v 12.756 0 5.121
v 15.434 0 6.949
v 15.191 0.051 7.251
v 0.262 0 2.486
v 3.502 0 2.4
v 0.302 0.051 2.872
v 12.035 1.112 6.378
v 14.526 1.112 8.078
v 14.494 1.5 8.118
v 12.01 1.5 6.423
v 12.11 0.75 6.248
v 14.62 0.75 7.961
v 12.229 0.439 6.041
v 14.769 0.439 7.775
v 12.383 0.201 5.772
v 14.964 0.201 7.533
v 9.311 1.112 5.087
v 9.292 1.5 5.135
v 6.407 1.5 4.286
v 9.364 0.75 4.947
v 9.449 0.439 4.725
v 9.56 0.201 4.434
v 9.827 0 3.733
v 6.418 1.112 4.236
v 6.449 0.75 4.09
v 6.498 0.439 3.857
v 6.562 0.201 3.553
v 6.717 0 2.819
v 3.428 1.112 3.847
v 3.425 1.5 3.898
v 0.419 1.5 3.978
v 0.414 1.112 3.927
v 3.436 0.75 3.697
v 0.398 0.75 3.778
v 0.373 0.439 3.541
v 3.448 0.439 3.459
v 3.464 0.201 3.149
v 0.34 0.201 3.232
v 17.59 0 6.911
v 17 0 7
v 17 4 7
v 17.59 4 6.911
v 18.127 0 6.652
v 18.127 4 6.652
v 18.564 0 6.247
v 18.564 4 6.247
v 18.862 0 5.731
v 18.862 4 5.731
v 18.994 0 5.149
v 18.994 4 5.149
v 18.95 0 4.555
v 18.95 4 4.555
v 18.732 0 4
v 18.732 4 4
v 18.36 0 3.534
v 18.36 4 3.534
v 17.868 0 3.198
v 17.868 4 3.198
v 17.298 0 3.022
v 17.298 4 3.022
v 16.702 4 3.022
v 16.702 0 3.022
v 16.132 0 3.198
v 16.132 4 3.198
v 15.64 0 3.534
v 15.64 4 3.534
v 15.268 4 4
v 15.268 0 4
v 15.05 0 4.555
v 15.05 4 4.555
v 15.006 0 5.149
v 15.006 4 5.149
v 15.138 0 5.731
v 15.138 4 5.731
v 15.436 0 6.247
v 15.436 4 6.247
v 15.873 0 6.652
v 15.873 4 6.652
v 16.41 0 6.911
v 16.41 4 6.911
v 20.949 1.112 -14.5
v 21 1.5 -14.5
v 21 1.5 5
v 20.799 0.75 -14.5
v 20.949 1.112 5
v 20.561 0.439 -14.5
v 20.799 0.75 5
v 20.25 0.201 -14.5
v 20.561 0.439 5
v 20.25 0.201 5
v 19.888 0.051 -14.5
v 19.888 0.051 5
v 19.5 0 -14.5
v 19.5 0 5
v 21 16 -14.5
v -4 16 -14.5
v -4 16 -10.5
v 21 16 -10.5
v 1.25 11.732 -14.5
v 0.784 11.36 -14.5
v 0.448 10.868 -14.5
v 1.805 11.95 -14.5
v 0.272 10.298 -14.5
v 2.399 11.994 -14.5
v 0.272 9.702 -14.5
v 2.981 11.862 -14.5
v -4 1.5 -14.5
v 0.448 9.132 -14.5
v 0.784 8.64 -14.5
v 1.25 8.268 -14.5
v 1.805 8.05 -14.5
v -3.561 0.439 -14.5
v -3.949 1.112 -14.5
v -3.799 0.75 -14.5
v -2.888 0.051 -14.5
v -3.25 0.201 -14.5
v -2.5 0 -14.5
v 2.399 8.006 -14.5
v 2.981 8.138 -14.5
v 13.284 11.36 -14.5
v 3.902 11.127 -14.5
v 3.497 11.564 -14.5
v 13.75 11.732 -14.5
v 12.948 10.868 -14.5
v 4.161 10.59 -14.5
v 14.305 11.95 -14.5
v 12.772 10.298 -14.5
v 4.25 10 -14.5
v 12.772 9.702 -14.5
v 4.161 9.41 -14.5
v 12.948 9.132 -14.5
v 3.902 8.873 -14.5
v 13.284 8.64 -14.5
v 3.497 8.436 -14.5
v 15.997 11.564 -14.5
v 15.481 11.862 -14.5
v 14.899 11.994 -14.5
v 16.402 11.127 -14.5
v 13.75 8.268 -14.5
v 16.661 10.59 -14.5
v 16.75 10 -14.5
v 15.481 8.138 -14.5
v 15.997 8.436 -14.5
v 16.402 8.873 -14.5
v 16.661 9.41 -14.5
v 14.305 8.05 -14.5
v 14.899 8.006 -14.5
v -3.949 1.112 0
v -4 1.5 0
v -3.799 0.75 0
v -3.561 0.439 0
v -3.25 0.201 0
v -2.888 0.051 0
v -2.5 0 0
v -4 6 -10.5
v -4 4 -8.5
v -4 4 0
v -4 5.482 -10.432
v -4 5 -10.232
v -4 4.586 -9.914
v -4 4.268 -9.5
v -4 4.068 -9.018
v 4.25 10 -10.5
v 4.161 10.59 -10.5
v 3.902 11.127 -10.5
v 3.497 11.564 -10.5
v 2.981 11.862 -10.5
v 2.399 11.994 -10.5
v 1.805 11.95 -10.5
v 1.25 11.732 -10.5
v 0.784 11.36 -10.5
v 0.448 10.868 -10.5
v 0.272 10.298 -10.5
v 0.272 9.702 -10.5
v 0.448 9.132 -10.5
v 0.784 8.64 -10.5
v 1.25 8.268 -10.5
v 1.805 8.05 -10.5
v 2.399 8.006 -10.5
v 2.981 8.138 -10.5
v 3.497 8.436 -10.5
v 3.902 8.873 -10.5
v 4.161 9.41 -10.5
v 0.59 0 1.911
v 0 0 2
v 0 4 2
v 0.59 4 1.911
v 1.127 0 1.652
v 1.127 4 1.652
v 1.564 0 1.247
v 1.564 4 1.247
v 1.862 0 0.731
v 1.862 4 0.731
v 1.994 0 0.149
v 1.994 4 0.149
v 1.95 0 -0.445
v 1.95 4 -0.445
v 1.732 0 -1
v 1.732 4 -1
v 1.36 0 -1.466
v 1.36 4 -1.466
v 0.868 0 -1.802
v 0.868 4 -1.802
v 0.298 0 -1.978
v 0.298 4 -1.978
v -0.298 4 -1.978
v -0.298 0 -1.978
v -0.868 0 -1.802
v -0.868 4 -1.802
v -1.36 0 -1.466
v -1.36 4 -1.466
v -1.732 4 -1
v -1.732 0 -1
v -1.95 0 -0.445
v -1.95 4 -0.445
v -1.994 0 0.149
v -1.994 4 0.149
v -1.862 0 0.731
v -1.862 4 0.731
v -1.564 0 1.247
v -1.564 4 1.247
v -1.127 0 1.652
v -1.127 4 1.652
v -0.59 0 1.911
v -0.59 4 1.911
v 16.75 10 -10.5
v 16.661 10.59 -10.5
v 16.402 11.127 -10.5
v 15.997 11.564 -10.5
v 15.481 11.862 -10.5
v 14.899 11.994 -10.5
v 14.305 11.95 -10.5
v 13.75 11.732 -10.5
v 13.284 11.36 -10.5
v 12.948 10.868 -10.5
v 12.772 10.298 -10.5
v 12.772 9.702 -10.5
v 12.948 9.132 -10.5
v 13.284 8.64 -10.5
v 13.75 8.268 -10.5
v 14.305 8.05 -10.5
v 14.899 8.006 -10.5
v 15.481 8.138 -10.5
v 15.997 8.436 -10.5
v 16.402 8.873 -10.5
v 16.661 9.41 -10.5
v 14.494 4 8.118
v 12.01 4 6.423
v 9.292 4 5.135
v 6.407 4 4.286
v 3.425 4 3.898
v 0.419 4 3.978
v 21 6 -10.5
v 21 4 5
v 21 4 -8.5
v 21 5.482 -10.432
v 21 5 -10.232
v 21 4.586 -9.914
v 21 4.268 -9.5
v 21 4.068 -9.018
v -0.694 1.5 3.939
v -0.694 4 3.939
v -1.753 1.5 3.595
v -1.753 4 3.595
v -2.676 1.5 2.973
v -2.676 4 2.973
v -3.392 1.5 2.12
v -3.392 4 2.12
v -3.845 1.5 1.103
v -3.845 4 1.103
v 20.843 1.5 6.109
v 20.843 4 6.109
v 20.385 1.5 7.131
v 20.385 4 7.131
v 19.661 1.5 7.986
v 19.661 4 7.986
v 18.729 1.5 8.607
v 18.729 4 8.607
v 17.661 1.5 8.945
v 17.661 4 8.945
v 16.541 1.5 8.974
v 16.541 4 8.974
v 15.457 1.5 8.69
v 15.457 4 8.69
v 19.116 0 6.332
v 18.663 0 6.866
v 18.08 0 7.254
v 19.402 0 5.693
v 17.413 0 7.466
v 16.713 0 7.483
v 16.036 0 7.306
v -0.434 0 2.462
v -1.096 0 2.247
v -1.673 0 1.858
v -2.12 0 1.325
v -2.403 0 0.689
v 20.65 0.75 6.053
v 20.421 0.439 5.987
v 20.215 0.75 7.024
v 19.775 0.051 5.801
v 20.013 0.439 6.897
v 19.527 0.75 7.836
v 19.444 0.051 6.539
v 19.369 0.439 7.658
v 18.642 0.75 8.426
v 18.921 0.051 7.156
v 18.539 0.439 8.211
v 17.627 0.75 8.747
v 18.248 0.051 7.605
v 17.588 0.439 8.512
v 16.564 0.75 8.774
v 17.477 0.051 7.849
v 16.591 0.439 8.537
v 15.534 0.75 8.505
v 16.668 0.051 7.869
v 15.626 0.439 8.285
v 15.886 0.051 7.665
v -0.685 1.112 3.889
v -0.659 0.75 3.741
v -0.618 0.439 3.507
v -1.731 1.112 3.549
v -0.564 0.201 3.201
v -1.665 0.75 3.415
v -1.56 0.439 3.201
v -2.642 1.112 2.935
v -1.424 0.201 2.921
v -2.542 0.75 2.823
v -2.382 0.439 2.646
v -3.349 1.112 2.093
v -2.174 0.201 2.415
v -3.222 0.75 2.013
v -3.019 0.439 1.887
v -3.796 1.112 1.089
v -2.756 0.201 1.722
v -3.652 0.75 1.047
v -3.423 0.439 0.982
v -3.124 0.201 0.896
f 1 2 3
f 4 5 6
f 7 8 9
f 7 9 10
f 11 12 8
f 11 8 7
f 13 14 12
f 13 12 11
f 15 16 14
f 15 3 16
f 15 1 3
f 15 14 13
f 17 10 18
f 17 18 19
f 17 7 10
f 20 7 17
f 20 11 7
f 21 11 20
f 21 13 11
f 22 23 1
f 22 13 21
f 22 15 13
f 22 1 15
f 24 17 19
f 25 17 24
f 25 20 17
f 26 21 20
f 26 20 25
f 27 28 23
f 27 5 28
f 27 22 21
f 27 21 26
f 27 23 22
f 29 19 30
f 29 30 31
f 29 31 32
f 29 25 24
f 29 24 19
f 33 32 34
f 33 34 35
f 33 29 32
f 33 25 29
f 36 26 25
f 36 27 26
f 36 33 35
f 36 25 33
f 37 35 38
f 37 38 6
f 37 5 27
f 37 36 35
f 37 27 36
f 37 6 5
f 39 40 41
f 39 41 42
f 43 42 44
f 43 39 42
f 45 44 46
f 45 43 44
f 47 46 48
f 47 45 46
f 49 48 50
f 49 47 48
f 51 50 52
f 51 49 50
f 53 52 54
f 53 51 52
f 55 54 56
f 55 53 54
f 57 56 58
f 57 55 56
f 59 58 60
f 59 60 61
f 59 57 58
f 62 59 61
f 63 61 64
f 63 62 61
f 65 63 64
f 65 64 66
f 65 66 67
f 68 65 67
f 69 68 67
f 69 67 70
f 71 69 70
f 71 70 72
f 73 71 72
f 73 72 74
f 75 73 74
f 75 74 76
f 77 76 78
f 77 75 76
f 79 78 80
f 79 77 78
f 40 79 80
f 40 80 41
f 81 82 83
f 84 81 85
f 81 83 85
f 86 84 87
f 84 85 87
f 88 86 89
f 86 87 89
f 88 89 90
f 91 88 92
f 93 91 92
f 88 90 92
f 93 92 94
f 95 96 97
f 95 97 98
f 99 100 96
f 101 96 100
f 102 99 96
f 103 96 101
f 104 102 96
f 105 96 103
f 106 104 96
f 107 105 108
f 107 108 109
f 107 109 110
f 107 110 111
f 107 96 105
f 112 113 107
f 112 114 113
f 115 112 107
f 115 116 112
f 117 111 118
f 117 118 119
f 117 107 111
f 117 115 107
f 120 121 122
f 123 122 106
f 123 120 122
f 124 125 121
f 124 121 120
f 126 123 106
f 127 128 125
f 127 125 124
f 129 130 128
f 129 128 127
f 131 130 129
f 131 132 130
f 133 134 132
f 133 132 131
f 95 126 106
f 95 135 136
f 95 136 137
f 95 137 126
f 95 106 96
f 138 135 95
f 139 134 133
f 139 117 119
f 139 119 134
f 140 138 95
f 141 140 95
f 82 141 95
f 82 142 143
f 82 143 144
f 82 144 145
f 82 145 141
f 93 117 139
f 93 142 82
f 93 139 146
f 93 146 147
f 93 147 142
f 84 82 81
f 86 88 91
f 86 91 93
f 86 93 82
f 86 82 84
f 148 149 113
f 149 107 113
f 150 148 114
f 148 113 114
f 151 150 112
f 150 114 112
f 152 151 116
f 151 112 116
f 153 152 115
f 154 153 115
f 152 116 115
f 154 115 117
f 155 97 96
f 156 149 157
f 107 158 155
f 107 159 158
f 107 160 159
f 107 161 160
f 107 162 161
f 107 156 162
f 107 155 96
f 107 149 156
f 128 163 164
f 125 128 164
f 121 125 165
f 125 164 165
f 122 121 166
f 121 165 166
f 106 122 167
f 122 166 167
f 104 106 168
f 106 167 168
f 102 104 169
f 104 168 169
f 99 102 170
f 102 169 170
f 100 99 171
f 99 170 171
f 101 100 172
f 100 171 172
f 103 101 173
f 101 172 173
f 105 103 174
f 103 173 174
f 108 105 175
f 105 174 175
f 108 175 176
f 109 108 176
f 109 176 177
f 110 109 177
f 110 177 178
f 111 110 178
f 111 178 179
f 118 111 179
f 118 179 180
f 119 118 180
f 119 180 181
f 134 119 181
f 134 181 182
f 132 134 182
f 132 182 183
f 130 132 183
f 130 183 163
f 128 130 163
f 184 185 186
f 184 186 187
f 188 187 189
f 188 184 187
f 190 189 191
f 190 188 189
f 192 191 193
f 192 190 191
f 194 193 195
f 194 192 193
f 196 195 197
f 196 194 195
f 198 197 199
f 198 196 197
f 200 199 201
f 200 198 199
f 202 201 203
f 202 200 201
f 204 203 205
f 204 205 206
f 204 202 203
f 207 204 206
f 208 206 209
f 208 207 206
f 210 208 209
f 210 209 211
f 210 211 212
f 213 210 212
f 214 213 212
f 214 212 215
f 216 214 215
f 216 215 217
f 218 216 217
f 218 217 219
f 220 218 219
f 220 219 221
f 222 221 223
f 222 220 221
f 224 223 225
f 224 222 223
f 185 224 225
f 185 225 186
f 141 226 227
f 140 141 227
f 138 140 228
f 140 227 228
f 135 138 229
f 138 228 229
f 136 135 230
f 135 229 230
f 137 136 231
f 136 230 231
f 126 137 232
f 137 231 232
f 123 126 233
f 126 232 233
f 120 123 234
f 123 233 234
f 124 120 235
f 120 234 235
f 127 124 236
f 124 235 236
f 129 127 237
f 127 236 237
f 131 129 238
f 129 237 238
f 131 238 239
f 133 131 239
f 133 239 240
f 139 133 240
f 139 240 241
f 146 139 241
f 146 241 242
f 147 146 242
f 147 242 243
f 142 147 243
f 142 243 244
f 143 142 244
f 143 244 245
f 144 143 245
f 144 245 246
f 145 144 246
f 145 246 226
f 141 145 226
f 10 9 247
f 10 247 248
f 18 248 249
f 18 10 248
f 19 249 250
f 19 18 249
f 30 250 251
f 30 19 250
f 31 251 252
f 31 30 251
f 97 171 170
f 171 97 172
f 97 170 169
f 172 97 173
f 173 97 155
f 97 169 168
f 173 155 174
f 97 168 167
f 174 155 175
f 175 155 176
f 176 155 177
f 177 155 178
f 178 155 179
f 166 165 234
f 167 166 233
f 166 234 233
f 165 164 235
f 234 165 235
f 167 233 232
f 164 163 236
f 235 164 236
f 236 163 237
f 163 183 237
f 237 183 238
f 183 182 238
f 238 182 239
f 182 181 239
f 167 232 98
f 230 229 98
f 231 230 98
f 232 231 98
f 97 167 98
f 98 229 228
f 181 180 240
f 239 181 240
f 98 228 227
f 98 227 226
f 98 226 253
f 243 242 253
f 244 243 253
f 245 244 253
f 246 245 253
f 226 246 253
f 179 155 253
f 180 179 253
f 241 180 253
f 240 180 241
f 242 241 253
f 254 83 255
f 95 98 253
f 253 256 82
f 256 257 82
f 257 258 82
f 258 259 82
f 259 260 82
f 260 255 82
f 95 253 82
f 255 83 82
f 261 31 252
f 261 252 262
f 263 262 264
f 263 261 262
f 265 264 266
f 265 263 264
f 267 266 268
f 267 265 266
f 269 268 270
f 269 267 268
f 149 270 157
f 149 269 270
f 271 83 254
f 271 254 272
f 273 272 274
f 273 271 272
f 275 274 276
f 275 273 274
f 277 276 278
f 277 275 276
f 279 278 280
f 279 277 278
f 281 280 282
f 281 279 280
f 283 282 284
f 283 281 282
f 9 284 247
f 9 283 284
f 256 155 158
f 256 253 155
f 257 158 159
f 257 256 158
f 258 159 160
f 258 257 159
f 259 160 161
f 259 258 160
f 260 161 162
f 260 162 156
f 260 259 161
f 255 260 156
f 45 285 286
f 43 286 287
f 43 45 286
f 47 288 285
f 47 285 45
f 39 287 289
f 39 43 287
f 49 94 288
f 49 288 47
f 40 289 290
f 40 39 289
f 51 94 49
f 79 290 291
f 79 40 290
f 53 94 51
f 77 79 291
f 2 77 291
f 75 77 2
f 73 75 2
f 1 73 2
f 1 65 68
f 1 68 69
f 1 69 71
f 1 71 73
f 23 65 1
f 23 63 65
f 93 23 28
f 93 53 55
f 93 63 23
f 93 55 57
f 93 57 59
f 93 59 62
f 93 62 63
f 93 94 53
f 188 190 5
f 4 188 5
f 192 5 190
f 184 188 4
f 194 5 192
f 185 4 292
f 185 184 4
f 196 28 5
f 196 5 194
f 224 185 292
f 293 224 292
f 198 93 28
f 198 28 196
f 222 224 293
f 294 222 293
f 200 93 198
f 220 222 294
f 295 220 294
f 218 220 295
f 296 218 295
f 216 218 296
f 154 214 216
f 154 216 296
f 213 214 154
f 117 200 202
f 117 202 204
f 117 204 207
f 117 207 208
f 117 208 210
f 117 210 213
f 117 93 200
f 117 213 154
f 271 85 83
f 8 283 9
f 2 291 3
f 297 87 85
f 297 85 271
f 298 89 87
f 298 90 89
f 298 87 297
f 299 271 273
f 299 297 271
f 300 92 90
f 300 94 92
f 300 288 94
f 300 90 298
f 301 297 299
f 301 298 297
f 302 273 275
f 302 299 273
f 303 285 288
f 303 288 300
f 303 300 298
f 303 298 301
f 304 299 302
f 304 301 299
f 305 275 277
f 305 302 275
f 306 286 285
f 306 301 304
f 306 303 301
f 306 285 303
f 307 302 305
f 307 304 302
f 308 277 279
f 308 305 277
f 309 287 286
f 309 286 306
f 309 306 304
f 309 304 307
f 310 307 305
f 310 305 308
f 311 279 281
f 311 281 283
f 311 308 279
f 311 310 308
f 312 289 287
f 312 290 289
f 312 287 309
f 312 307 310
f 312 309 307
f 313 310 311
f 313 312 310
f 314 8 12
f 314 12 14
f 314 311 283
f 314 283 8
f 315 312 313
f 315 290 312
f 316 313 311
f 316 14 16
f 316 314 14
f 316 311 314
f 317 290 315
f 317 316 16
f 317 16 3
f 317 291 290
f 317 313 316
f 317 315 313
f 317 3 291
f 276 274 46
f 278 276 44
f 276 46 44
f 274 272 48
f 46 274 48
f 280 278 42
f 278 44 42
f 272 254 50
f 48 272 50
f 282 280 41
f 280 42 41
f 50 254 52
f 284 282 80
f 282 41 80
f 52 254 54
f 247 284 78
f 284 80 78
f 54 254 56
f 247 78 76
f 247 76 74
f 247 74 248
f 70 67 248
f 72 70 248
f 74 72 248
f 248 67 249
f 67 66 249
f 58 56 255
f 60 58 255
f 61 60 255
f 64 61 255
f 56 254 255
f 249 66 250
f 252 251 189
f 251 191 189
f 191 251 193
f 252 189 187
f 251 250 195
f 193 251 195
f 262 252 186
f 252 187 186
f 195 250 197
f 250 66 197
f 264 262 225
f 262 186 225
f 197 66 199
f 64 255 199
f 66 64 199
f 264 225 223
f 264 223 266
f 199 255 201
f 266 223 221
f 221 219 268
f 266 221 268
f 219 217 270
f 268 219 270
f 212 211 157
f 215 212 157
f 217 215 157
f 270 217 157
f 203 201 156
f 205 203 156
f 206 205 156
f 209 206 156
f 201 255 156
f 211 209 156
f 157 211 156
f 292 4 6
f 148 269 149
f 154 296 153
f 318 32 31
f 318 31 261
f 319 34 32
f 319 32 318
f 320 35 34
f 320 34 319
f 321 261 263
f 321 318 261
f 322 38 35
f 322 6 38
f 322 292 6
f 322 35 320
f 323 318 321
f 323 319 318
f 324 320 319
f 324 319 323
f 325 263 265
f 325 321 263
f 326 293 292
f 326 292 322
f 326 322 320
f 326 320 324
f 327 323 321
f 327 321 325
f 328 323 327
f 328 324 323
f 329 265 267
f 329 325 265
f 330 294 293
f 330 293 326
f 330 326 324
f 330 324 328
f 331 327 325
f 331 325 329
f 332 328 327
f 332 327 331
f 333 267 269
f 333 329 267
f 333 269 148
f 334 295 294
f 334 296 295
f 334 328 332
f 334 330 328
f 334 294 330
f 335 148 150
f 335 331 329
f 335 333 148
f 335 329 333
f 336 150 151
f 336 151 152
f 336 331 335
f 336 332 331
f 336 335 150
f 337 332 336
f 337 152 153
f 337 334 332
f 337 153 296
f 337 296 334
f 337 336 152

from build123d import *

# Parameters (mm, degrees)
SKETCH1_R           = 2
BOSS_EXTRUDE1_DEPTH = 4
SKETCH2_W           = 25
SKETCH2_H           = 4
BOSS_EXTRUDE2_DEPTH = 12
SKETCH3_R           = 2
CUT_EXTRUDE1_DEPTH  = 12
FILLET1_R           = 2
FILLET2_R           = 1.5


with BuildPart() as part:
    # Sketch1 → Boss-Extrude1 (new body)
    with BuildSketch(Plane(origin=(0, 0, 0), x_dir=(1, 0, 0), z_dir=(0, 1, 0))):
        with BuildLine():
            Line((-4, 14.5), (21, 14.5))
            Line((21, 14.5), (21, -5))
            ThreePointArc((21, -5), (18.728627677, -8.607193695), (14.494076823, -8.117747429))
            ThreePointArc((14.494076823, -8.117747429), (7.866380142, -4.654307517), (0.418938394, -3.978000832))
            ThreePointArc((0.418938394, -3.978000832), (-2.676214343, -2.972856671), (-4, 0))
            Line((-4, 0), (-4, 14.5))
        make_face()
        with Locations(Location((0, 0, 0), (0, 0, 270))):
            Circle(SKETCH1_R, mode=Mode.SUBTRACT)
        with Locations(Location((17, -5, 0), (0, 0, 270))):
            Circle(SKETCH1_R, mode=Mode.SUBTRACT)
    extrude(amount=BOSS_EXTRUDE1_DEPTH)

    # Sketch2 → Boss-Extrude2 (add)
    with BuildSketch(Plane(origin=(0, 4, 0), x_dir=(1, 0, 0), z_dir=(0, 1, 0))):
        with Locations((8.5, 12.5)):
            Rectangle(SKETCH2_W, SKETCH2_H)
    extrude(amount=BOSS_EXTRUDE2_DEPTH)

    # Sketch3 → Cut-Extrude1 (cut)
    with BuildSketch(Plane.XY.offset(-10.5)):
        with Locations((2.25, 10)):
            Circle(SKETCH3_R)
        with Locations((14.75, 10)):
            Circle(SKETCH3_R)
    extrude(amount=-CUT_EXTRUDE1_DEPTH, mode=Mode.SUBTRACT)

    # Fillet1
    fillet1_edges = [part.edges().sort_by_distance(p)[0] for p in [
        (8.5, 4, -10.5),
    ]]
    fillet(fillet1_edges, radius=FILLET1_R)

    # Fillet2
    fillet2_edges = [part.edges().sort_by_distance(p)[0] for p in [
        (-2.676214343, 0, 2.972856671),
        (-4, 0, -7.25),
        (21, 0, -4.75),
        (18.728627677, 0, 8.607193695),
        (7.866380142, 0, 4.654307517),
    ]]
    fillet(fillet2_edges, radius=FILLET2_R)


solid = part.part
